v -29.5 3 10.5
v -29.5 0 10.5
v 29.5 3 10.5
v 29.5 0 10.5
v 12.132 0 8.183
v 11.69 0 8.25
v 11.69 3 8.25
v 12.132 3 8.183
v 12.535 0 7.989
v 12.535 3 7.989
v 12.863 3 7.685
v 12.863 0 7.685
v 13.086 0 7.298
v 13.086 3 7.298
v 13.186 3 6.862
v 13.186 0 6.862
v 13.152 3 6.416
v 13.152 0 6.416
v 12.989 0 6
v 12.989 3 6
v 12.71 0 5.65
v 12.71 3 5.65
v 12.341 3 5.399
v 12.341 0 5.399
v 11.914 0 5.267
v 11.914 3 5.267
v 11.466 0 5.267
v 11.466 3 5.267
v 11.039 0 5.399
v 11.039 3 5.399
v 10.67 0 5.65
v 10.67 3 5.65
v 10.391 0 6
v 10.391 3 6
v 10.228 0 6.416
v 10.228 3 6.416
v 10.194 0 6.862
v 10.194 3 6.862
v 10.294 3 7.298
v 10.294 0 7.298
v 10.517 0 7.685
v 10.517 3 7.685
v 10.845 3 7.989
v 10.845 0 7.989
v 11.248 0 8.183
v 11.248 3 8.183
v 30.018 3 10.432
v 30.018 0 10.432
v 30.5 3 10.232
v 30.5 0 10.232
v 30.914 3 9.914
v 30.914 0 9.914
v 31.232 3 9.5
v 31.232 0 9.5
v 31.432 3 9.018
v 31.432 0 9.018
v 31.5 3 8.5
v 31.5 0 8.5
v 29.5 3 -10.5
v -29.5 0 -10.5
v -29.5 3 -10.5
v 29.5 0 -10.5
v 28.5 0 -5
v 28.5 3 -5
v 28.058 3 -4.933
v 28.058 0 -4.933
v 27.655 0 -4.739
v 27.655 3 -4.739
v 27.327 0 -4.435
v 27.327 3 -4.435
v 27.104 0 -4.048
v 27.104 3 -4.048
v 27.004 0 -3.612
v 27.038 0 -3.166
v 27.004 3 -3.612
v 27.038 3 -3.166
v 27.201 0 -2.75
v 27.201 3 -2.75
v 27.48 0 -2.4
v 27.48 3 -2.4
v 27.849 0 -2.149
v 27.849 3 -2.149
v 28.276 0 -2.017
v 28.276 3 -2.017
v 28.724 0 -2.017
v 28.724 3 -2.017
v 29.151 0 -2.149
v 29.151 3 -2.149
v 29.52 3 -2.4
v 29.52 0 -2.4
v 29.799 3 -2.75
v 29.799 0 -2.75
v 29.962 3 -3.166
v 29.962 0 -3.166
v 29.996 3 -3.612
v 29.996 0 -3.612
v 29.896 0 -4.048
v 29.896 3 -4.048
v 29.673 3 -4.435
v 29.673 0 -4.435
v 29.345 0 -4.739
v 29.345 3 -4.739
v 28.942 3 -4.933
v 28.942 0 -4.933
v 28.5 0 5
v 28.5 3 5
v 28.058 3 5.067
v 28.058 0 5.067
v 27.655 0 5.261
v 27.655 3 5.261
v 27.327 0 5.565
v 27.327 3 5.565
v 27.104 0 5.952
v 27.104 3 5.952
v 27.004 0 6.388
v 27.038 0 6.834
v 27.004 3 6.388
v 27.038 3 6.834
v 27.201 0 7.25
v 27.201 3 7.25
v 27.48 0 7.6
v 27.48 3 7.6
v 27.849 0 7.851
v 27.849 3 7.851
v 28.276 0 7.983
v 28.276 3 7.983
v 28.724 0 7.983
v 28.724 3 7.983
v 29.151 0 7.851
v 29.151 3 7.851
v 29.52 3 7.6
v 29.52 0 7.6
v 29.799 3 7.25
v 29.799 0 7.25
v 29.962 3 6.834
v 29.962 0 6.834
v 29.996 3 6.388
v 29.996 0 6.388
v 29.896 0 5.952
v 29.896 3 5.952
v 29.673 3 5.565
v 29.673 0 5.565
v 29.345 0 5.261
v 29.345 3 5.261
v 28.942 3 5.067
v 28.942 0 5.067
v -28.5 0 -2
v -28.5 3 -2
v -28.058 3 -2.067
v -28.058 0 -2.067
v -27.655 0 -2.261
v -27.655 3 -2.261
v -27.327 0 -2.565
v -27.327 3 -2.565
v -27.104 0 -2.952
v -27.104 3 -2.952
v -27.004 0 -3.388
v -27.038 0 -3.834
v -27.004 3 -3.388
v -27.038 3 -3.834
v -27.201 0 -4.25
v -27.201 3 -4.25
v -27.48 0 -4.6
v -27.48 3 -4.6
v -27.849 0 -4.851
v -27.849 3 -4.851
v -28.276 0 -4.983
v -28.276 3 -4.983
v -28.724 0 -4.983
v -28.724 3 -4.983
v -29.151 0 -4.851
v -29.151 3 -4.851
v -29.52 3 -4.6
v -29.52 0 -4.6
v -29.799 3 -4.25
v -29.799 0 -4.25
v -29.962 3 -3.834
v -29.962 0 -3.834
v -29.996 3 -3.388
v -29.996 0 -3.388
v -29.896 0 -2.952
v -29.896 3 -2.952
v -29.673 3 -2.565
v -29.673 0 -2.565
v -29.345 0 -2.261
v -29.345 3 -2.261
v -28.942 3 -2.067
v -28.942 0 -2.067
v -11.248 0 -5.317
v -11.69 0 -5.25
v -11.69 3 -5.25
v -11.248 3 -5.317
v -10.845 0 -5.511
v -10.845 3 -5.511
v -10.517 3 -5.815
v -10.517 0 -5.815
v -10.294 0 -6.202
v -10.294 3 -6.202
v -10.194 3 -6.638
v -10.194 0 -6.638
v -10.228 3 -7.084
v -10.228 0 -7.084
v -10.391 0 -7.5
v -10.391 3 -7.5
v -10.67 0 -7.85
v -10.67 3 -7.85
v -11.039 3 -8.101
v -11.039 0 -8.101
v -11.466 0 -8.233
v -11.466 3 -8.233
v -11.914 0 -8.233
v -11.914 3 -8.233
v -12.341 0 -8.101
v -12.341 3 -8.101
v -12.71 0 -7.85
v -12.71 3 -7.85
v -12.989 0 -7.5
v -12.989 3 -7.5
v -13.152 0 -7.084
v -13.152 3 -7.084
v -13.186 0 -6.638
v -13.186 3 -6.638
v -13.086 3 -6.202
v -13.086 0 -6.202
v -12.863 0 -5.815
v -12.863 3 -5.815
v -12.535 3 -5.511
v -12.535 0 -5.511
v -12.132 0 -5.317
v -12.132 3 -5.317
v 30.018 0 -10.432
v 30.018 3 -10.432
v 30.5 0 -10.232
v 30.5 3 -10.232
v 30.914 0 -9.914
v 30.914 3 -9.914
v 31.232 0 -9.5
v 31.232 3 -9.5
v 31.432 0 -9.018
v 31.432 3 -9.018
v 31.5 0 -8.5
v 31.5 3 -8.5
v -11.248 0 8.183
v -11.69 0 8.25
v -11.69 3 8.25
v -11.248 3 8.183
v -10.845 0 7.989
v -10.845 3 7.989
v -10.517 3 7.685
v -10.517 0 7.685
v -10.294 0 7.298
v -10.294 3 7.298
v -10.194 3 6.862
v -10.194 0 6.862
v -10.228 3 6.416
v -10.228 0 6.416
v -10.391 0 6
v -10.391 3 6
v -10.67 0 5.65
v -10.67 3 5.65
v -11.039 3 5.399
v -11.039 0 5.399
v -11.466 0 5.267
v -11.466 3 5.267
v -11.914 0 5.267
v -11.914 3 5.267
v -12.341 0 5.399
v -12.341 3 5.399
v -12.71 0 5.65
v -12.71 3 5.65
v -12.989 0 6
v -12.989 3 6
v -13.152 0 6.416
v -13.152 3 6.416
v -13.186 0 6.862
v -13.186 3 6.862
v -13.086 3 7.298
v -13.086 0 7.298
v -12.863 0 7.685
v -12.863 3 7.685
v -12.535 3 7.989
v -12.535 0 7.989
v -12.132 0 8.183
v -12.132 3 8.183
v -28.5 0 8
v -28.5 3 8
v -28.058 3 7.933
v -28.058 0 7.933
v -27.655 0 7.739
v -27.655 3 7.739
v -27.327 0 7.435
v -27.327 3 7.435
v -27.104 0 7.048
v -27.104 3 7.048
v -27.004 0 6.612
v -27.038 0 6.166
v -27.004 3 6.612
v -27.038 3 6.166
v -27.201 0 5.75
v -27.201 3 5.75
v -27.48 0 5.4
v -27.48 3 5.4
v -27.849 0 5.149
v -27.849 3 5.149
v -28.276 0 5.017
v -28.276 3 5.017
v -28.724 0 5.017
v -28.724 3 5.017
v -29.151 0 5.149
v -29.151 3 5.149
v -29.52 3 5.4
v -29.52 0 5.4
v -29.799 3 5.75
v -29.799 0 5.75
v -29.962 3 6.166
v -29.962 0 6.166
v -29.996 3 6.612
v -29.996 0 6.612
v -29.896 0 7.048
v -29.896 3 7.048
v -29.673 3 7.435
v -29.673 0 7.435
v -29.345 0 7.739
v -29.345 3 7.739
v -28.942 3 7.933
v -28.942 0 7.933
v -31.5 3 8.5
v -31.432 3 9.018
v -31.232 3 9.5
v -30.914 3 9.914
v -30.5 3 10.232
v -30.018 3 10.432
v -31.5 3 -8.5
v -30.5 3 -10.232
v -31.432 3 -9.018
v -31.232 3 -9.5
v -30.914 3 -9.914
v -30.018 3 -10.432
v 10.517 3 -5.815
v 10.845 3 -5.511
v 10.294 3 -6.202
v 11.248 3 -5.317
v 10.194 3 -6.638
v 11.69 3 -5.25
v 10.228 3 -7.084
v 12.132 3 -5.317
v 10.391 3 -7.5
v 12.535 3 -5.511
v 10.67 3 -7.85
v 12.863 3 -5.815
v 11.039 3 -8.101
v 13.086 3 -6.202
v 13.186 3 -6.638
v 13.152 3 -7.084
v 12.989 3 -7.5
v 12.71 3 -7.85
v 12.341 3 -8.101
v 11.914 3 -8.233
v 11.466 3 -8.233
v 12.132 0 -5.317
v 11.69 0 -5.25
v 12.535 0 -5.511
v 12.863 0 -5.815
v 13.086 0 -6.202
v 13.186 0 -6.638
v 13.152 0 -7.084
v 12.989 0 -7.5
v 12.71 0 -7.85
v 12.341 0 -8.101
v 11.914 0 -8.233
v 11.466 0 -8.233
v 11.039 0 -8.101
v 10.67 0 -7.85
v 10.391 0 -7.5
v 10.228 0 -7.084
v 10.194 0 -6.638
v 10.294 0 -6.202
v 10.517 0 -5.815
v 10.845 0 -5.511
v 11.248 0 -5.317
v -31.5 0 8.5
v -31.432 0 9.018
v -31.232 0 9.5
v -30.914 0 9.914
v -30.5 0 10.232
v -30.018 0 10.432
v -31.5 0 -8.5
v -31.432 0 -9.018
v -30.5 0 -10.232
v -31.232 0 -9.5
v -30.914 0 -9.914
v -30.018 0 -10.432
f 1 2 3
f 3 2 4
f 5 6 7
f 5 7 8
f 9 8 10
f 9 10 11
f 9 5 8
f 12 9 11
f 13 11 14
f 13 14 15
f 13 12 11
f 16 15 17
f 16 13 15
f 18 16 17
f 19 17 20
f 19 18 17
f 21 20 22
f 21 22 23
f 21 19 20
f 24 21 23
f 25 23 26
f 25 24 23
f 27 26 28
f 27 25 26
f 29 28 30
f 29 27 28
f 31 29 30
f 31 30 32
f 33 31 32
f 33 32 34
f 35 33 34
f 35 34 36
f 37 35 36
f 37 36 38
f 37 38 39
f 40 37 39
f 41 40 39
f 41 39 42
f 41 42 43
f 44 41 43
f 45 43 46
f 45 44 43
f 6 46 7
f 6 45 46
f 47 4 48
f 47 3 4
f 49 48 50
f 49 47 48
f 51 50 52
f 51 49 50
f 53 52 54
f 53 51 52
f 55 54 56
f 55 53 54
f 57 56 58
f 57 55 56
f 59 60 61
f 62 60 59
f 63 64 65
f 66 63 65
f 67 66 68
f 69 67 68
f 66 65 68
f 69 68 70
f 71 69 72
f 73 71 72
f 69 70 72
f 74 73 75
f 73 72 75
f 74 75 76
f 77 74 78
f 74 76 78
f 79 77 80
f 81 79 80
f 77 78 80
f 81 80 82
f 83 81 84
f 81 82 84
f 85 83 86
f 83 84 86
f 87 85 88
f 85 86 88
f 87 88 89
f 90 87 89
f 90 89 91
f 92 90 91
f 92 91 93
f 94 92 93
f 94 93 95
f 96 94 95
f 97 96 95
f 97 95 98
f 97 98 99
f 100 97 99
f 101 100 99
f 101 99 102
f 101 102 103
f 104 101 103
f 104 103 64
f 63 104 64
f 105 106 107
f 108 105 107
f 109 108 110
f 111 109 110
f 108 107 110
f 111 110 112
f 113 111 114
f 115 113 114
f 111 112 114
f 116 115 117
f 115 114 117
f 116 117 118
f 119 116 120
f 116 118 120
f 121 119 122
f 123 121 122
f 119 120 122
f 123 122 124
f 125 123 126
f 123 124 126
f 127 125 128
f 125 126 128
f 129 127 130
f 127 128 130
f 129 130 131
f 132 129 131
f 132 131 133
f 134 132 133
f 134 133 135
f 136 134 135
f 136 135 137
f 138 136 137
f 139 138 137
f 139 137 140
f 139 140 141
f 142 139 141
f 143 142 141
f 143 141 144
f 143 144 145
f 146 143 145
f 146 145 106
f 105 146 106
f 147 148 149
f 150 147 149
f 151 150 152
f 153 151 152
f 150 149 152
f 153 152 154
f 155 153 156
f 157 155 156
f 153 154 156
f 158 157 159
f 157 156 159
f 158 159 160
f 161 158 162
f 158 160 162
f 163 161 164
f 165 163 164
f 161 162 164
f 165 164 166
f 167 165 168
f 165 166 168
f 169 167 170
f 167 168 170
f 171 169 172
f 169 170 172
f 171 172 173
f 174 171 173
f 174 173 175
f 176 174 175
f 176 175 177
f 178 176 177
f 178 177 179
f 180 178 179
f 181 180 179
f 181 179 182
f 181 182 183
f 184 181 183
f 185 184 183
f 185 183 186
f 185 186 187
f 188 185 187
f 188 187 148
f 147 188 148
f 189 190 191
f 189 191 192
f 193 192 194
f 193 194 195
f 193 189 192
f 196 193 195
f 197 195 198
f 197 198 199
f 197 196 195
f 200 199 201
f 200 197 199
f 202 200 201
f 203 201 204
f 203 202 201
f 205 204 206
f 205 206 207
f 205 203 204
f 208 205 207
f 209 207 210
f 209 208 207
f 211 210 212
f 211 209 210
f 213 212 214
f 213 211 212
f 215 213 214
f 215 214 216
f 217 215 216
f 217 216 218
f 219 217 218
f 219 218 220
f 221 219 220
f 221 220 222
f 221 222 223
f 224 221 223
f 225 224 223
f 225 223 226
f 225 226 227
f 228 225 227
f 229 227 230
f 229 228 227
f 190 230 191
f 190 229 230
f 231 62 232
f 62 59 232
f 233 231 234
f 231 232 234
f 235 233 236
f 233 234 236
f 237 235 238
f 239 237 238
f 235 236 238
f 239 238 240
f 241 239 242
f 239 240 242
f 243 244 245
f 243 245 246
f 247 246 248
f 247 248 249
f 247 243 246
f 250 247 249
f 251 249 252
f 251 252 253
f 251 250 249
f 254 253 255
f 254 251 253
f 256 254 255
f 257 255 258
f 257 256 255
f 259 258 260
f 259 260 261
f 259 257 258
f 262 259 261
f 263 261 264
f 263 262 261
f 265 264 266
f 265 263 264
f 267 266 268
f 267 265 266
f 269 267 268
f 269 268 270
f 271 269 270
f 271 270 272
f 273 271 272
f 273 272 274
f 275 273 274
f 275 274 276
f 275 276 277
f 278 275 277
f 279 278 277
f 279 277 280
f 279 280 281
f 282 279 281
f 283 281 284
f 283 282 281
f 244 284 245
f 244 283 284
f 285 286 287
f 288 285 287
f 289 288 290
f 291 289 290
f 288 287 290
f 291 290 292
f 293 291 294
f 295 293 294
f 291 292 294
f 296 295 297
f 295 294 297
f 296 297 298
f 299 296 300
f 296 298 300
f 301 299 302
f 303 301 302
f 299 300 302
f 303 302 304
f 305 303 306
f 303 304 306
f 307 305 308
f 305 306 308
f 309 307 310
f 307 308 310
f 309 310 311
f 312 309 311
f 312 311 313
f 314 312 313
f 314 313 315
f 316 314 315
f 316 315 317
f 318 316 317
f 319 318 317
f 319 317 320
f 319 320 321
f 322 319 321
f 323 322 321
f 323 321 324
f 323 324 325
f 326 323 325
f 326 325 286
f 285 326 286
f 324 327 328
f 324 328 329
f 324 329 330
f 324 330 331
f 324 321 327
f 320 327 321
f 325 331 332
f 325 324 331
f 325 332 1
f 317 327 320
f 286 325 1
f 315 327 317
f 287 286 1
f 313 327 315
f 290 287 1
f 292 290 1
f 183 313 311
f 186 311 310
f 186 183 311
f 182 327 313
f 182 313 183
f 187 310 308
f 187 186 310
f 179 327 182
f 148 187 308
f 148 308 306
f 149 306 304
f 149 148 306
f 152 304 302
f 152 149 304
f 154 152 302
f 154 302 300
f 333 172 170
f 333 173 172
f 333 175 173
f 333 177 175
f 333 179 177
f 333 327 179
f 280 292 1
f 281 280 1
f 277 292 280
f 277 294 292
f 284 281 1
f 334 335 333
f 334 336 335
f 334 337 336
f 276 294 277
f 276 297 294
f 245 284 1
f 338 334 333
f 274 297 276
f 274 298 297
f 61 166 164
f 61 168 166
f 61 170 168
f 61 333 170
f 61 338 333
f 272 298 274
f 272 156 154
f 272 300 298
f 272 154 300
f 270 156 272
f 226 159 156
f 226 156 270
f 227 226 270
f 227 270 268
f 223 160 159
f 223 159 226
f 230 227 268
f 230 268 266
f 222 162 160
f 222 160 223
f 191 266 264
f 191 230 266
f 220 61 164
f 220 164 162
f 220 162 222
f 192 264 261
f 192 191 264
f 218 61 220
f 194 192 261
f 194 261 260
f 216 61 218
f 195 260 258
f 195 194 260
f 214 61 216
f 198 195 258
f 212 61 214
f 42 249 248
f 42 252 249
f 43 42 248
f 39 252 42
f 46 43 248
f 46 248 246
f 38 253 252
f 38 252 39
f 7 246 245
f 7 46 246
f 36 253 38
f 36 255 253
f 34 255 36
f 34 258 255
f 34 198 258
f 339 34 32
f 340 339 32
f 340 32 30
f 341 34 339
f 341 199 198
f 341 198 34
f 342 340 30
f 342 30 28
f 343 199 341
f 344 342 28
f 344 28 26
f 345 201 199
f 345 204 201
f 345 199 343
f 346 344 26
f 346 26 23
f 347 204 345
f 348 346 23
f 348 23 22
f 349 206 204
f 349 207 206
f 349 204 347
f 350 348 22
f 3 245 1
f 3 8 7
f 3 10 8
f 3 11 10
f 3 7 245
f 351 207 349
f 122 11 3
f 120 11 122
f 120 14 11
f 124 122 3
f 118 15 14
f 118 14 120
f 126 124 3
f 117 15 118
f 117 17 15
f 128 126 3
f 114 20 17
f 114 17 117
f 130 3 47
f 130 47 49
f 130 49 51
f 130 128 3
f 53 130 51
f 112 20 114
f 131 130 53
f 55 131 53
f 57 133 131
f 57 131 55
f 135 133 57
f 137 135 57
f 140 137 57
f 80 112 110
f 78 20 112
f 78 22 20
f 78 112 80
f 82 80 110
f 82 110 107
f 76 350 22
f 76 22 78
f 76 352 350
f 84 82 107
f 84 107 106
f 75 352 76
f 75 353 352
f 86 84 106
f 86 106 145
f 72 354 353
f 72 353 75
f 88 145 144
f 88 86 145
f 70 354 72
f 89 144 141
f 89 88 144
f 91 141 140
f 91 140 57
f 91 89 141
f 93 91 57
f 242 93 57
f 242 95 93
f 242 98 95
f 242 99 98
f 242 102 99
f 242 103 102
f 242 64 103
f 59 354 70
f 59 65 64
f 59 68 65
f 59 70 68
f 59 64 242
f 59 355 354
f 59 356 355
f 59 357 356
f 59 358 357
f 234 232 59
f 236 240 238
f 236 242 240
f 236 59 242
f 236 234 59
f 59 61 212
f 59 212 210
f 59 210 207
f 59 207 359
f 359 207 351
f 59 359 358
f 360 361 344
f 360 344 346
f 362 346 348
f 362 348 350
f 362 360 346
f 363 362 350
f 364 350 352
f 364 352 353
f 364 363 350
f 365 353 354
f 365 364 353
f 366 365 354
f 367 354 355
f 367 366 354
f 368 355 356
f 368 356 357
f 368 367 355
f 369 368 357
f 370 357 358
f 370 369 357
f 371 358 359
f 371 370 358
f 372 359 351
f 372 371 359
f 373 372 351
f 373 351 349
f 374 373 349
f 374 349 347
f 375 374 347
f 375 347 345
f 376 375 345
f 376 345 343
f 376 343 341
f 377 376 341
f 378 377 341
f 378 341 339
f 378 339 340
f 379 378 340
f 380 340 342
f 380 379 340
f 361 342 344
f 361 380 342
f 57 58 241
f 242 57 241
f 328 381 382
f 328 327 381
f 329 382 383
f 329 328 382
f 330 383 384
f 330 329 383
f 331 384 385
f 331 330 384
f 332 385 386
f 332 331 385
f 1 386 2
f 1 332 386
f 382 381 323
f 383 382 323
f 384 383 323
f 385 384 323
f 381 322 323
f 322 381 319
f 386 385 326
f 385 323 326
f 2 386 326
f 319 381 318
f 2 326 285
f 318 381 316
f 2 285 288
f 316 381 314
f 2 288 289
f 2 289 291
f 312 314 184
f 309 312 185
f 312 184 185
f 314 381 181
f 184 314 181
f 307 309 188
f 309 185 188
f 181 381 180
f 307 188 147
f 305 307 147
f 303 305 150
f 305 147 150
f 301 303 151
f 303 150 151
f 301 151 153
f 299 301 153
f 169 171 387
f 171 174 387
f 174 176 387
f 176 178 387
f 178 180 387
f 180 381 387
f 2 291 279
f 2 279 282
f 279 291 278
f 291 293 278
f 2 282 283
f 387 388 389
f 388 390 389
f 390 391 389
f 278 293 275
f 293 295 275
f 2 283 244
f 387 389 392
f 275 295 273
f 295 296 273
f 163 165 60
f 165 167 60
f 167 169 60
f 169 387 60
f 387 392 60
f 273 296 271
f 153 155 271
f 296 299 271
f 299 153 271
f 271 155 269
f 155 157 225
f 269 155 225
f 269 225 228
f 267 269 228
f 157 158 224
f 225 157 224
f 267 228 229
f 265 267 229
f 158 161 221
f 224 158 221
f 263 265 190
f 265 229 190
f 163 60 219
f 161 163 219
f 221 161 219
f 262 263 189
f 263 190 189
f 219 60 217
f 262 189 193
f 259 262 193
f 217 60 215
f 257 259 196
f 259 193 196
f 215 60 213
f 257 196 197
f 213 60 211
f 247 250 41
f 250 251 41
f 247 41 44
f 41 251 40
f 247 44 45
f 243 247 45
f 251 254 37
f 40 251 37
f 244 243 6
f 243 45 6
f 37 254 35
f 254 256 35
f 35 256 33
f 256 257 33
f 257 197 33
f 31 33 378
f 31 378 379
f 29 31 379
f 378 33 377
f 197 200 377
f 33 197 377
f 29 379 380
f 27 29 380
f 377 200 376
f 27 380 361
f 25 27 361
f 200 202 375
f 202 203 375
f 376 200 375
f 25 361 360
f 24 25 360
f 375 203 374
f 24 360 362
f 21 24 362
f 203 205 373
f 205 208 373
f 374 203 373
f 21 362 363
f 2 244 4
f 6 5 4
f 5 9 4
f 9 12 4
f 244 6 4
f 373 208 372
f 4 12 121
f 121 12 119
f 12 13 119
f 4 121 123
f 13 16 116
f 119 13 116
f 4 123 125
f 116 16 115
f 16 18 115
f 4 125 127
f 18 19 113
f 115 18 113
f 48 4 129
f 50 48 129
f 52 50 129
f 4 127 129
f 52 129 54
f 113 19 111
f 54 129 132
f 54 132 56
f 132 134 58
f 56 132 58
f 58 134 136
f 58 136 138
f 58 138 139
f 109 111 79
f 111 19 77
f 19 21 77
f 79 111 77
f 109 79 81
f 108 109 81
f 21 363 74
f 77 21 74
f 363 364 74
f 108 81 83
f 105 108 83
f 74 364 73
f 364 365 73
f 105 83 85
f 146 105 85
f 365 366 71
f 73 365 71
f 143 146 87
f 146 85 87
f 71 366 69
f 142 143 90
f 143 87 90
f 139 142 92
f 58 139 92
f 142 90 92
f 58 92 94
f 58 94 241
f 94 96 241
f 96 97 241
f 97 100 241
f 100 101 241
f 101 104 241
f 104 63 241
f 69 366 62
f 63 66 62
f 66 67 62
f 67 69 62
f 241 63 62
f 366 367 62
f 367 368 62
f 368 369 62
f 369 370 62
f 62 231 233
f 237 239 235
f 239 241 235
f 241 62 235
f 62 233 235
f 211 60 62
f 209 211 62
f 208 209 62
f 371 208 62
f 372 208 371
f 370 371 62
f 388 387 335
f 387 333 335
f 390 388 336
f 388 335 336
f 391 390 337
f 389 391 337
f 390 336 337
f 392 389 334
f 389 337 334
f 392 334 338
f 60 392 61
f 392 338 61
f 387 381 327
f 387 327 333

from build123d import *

# Parameters (mm, degrees)
SKETCH_1_W          = 63
SKETCH_1_H          = 21
SKETCH_1_R          = 1.5
EXTRUDE_1_DEPTH     = 3
FILLET_1_R          = 2
SKETCH_3_R          = 1.5
CUT_EXTRUDE_2_DEPTH = 34.339166156


with BuildPart() as part:
    # 草图1 → 凸台-拉伸1 (new body)
    with BuildSketch(Plane(origin=(0, 0, 0), x_dir=(1, 0, 0), z_dir=(0, 1, 0))):
        Rectangle(SKETCH_1_W, SKETCH_1_H)
        with Locations(Location((-11.69, 6.75, 0), (0, 0, 270))):
            Circle(SKETCH_1_R, mode=Mode.SUBTRACT)
        with Locations(Location((11.69, 6.75, 0), (0, 0, 270))):
            Circle(SKETCH_1_R, mode=Mode.SUBTRACT)
        with Locations(Location((11.69, -6.75, 0), (0, 0, 270))):
            Circle(SKETCH_1_R, mode=Mode.SUBTRACT)
        with Locations(Location((-11.69, -6.75, 0), (0, 0, 270))):
            Circle(SKETCH_1_R, mode=Mode.SUBTRACT)
    extrude(amount=EXTRUDE_1_DEPTH)

    # 圆角1
    fillet_1_edges = [part.edges().sort_by_distance(p)[0] for p in [
        (31.5, 1.5, 10.5),
        (-31.5, 1.5, 10.5),
        (-31.5, 1.5, -10.5),
        (31.5, 1.5, -10.5),
    ]]
    fillet(fillet_1_edges, radius=FILLET_1_R)

    # 草图3 → 切除-拉伸2 (cut, through all)
    with BuildSketch(Plane(origin=(0, 3, 0), x_dir=(1, 0, 0), z_dir=(0, 1, 0))):
        with Locations(Location((-28.5, -6.5, 0), (0, 0, 270))):
            Circle(SKETCH_3_R)
        with Locations(Location((-28.5, 3.5, 0), (0, 0, 270))):
            Circle(SKETCH_3_R)
        with Locations(Location((28.5, -6.5, 0), (0, 0, 90))):
            Circle(SKETCH_3_R)
        with Locations(Location((28.5, 3.5, 0), (0, 0, 90))):
            Circle(SKETCH_3_R)
    extrude(amount=-CUT_EXTRUDE_2_DEPTH, mode=Mode.SUBTRACT)


solid = part.part
